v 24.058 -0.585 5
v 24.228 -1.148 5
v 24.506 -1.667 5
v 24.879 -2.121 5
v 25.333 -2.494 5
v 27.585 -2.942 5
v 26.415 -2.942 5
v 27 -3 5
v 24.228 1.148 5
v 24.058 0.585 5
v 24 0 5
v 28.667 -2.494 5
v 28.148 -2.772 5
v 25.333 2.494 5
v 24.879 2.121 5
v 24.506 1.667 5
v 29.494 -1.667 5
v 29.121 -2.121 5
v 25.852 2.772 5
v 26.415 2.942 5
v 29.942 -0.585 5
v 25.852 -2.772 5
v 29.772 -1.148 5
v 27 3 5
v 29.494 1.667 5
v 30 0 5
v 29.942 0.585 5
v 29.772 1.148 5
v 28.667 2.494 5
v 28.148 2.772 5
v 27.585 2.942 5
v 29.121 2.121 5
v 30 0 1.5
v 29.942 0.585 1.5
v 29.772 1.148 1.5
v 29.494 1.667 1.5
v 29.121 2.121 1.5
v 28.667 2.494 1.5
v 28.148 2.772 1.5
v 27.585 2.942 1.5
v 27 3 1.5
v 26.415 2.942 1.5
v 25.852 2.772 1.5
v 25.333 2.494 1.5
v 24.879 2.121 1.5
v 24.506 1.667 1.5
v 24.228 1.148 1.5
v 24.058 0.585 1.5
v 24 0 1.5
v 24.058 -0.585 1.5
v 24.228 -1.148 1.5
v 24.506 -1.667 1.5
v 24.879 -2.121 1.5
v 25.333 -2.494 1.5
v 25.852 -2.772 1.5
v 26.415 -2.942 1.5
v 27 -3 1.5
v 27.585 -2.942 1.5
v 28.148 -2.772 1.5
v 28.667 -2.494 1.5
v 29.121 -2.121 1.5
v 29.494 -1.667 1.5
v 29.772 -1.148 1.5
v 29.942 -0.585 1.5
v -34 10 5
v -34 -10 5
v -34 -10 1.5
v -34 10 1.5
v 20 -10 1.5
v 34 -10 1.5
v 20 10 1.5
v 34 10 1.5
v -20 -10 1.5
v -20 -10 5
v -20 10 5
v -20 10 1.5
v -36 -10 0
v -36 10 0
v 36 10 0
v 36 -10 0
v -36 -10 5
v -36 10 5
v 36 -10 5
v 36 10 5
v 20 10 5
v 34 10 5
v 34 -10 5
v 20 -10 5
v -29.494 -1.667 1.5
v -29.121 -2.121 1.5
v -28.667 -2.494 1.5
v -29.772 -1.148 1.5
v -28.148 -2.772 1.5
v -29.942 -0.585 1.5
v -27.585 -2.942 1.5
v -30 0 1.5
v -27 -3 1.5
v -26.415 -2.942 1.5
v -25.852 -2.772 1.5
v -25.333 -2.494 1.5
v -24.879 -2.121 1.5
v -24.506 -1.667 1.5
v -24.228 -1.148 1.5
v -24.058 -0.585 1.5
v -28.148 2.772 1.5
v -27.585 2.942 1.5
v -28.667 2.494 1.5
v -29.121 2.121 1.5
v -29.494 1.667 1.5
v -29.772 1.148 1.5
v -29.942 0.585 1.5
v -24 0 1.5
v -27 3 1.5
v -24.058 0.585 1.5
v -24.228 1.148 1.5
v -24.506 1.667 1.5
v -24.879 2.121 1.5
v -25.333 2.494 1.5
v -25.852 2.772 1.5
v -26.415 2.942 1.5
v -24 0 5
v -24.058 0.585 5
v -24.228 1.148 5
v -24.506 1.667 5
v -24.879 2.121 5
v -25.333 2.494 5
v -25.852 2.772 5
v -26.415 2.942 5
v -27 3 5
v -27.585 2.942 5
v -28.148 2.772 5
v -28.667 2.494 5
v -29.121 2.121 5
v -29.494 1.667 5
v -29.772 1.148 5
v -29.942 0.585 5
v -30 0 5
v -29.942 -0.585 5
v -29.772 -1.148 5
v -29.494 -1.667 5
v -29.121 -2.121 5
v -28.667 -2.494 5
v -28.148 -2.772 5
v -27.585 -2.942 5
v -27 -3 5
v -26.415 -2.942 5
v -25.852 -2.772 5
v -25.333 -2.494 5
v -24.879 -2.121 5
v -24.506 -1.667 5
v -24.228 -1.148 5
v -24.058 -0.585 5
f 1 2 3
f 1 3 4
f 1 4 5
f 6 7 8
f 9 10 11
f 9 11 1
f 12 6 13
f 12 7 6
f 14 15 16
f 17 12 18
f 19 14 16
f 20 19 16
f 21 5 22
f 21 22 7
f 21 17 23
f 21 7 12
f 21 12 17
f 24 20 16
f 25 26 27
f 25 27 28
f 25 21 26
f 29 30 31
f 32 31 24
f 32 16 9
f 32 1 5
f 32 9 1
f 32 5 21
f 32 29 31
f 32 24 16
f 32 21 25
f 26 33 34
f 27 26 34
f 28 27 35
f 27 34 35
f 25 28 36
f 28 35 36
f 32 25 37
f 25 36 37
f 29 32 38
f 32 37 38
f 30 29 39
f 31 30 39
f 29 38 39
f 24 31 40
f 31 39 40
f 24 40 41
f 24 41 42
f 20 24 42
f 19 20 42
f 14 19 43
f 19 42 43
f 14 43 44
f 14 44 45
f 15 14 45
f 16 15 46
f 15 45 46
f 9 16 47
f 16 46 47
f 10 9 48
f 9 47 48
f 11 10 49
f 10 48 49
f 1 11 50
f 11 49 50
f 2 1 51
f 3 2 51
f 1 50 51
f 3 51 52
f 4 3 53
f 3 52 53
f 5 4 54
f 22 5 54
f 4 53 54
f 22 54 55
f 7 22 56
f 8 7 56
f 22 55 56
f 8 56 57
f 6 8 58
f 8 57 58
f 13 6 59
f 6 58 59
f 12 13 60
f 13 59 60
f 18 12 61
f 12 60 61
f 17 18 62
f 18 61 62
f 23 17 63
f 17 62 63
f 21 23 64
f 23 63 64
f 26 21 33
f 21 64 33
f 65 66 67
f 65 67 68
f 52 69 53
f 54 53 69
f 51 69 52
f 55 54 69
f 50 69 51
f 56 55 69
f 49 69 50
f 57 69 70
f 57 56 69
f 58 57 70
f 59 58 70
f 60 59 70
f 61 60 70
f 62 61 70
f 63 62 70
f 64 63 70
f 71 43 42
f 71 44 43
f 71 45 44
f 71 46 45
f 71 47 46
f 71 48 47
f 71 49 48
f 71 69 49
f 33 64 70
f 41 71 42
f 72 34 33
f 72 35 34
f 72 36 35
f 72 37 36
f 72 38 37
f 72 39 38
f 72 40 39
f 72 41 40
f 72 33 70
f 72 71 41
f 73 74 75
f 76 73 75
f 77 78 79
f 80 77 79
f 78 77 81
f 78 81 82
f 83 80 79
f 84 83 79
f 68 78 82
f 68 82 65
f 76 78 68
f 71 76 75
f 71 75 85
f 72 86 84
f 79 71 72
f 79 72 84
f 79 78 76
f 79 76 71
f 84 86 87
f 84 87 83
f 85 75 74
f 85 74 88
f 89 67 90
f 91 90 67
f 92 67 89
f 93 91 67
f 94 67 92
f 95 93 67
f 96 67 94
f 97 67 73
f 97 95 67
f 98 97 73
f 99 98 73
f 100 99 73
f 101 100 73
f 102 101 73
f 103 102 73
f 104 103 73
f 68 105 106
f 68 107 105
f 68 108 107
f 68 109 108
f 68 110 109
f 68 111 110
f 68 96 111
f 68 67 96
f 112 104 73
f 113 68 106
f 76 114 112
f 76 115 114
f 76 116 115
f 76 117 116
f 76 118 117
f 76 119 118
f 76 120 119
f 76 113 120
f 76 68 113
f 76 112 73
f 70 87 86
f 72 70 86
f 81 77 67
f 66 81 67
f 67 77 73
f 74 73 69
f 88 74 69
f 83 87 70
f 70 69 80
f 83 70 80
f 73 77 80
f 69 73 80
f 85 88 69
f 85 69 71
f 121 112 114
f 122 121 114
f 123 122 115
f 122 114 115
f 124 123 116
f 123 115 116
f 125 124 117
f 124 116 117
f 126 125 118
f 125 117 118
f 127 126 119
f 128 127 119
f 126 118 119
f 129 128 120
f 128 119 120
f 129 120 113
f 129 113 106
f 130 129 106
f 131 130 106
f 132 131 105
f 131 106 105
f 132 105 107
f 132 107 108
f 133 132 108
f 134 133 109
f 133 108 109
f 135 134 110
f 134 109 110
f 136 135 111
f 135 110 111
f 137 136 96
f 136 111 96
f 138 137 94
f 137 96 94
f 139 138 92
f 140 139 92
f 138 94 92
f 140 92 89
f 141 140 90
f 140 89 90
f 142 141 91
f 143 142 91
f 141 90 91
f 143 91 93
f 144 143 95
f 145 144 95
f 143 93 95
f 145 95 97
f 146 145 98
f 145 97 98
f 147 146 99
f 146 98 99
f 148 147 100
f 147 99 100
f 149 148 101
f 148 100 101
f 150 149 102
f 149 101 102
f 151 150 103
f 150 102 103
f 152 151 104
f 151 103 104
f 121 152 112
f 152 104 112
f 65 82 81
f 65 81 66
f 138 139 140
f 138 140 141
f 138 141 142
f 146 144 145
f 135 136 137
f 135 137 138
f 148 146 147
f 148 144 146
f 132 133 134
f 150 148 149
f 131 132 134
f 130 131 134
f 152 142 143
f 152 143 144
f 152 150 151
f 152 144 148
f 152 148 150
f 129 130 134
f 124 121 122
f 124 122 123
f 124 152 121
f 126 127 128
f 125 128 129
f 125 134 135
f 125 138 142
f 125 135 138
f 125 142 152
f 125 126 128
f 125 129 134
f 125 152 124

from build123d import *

# Parameters (mm, degrees)
F0_W     = 72
F0_H     = 20
F1_DEPTH = 5
F2_W     = 14
F2_H     = 20
F3_DEPTH = 3.5
F4_R     = 3
F5_DEPTH = 3.5


with BuildPart() as f1:
    # F0 (on Top) → F1 (new body)
    with BuildSketch(Plane.XY):
        Rectangle(F0_W, F0_H)
    extrude(amount=F1_DEPTH)

    # F2 (on face) → F3 (cut)
    with BuildSketch(Plane.XY.offset(5)):
        with Locations((27, 0)):
            Rectangle(F2_W, F2_H)
        with Locations((-27, 0)):
            Rectangle(F2_W, F2_H)
    extrude(amount=-F3_DEPTH, mode=Mode.SUBTRACT)

    # F4 (on face) → F5 (join)
    with BuildSketch(Plane.XY.offset(1.5)):
        with Locations((-27, 0)):
            Circle(F4_R)
        with Locations((27, 0)):
            Circle(F4_R)
    extrude(amount=F5_DEPTH)


solid = f1.part
